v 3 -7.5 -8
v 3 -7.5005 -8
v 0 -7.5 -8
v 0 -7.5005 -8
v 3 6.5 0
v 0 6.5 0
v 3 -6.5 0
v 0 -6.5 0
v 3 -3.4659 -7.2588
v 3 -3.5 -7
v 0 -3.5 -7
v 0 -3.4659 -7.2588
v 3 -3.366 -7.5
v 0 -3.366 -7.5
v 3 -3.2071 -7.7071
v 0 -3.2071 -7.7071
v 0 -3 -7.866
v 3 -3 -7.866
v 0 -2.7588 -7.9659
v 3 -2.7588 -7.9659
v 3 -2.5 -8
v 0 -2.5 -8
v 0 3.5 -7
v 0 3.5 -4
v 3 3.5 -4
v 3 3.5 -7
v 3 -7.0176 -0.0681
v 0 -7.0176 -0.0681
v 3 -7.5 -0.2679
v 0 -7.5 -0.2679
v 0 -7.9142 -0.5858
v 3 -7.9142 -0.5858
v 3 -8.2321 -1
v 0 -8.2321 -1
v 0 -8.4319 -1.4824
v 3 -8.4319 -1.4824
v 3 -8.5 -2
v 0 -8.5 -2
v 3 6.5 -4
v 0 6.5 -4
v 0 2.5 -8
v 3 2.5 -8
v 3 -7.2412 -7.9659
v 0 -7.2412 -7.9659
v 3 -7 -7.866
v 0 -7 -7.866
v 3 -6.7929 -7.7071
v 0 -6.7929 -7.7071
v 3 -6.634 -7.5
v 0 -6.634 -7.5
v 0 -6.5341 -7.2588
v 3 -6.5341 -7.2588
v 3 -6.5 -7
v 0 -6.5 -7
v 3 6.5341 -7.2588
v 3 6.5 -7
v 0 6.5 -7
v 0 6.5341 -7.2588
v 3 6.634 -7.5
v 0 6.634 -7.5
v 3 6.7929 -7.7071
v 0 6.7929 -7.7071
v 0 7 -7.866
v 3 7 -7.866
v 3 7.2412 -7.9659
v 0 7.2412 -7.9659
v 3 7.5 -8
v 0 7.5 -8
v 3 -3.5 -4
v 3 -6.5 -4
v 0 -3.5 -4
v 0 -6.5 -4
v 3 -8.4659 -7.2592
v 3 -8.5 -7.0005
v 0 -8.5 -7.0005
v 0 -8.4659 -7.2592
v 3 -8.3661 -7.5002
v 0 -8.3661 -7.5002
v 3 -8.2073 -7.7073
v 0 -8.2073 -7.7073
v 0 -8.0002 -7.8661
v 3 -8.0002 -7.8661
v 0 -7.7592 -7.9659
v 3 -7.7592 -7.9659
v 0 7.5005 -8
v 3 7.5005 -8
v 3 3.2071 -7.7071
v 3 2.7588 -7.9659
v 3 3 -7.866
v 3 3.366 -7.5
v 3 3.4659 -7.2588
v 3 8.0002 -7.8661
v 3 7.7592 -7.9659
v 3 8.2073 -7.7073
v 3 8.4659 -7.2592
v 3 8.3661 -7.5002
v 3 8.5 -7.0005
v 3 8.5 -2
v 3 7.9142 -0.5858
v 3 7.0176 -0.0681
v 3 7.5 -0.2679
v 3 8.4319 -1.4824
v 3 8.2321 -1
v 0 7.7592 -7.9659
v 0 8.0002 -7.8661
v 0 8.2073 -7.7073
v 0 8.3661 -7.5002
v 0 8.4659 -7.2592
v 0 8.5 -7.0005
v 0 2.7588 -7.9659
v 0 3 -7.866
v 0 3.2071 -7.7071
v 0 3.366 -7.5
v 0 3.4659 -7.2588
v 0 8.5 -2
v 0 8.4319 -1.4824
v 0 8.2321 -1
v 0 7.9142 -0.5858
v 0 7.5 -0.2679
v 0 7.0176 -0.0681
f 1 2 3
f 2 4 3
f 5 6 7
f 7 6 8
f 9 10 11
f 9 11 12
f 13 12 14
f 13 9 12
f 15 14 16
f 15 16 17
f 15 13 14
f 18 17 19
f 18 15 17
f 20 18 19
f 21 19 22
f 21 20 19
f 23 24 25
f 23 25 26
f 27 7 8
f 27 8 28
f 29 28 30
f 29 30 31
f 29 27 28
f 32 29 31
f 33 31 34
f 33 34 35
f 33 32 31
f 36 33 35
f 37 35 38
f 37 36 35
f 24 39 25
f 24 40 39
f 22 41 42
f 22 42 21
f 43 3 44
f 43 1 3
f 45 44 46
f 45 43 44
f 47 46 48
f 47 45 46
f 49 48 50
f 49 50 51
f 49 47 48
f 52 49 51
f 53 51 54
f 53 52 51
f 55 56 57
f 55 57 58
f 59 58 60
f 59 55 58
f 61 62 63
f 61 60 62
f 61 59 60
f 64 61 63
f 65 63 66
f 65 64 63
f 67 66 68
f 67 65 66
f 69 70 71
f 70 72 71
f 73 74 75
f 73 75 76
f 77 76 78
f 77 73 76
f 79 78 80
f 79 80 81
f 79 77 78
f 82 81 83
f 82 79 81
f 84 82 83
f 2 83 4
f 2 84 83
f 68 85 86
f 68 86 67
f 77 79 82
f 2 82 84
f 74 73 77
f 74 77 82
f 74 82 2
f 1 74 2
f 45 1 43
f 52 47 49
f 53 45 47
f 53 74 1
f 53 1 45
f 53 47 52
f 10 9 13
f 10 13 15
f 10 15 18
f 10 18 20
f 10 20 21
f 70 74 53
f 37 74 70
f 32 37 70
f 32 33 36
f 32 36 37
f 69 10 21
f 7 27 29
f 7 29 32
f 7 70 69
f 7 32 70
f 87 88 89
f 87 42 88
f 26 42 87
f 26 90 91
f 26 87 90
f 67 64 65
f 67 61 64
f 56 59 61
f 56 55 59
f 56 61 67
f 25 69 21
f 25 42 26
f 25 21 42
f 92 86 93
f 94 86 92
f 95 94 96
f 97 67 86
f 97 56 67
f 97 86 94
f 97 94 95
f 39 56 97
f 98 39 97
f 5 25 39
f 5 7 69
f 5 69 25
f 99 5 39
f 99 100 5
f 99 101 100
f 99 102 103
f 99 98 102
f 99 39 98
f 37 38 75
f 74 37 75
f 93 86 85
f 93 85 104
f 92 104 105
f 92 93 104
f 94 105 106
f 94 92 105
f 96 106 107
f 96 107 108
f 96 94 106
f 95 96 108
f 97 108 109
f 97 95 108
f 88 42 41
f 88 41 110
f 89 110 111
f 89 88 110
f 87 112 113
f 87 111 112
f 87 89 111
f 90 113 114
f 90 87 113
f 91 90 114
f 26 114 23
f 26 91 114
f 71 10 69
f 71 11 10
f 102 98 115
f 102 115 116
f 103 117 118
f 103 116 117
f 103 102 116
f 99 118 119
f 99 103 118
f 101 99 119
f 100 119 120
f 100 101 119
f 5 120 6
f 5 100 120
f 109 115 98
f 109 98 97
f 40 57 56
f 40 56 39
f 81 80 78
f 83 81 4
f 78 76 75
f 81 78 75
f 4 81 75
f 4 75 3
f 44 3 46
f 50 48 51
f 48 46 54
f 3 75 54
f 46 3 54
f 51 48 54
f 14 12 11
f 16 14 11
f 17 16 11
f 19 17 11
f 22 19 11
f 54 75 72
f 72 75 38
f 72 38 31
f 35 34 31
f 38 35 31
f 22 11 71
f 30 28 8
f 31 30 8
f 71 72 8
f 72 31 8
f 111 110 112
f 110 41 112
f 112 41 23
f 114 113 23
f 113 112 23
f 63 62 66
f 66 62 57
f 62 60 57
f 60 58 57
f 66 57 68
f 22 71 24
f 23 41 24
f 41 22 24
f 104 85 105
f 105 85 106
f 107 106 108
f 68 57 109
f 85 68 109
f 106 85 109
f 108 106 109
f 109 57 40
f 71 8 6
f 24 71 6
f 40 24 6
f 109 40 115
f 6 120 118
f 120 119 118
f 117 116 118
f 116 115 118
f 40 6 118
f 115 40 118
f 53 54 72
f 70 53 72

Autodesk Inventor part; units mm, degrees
ref_plane "YZ Plane" through (0, 0, 0) normal (1, 0, 0) x (0, 1, 0)
ref_plane "XZ Plane" through (0, 0, 0) normal (0, 1, 0) x (-1, 0, 0)
ref_plane "XY Plane" through (0, 0, 0) normal (0, 0, 1) x (1, 0, 0)
sketch "草圖1" plane through (0, 0, 0) normal (1, 0, 0) x (0, 1, 0)
  line L0 (-8.5, 0) -> (-8.5, -8)
  line L1 (-8.5, -8) -> (-6.5, -8)
  line L2 (-6.5, -8) -> (-6.5, -4)
  line L3 (-6.5, -4) -> (-3.5, -4)
  line L4 (3.5, -4) -> (3.5, -8)
  line L5 (3.5, -8) -> (-3.5, -8)
  line L6 (8.5, 0) -> (8.5, -8)
  line L7 (8.5, -8) -> (6.5, -8)
  line L8 (6.5, -8) -> (6.5, -4)
  line L9 (6.5, -4) -> (3.5, -4)
  line L10 (8.5, 0) -> (-8.5, 0)
  line L11 (-3.5, -8) -> (-3.5, -4)
  point P0 (0, 0)
  point P1 (0, 0)
  point P2 (0, 0)
  dimension "d2" = 3
  dimension "d3" = 7
  dimension "d4" = 8
  dimension "d5" = 4
  dimension "d6" = 2
  dimension "d12" = 17
extrude "擠出1" add sketch "草圖1" along normal blind 3
fillet "圓角1" radius 2 2 edges at (1.5, 8.5, 0) (1.5, -8.5, 0)
fillet "圓角2" radius 1 4 edges at (1.5, 6.5, -8) (1.5, 3.5, -8) (1.5, -3.5, -8) (1.5, -6.5, -8)
fillet "圓角3" radius 1 2 edges at (1.5, 8.5, -8) (1.5, -8.5, -8)
properties part number "support" material "木材 (楓木)"
